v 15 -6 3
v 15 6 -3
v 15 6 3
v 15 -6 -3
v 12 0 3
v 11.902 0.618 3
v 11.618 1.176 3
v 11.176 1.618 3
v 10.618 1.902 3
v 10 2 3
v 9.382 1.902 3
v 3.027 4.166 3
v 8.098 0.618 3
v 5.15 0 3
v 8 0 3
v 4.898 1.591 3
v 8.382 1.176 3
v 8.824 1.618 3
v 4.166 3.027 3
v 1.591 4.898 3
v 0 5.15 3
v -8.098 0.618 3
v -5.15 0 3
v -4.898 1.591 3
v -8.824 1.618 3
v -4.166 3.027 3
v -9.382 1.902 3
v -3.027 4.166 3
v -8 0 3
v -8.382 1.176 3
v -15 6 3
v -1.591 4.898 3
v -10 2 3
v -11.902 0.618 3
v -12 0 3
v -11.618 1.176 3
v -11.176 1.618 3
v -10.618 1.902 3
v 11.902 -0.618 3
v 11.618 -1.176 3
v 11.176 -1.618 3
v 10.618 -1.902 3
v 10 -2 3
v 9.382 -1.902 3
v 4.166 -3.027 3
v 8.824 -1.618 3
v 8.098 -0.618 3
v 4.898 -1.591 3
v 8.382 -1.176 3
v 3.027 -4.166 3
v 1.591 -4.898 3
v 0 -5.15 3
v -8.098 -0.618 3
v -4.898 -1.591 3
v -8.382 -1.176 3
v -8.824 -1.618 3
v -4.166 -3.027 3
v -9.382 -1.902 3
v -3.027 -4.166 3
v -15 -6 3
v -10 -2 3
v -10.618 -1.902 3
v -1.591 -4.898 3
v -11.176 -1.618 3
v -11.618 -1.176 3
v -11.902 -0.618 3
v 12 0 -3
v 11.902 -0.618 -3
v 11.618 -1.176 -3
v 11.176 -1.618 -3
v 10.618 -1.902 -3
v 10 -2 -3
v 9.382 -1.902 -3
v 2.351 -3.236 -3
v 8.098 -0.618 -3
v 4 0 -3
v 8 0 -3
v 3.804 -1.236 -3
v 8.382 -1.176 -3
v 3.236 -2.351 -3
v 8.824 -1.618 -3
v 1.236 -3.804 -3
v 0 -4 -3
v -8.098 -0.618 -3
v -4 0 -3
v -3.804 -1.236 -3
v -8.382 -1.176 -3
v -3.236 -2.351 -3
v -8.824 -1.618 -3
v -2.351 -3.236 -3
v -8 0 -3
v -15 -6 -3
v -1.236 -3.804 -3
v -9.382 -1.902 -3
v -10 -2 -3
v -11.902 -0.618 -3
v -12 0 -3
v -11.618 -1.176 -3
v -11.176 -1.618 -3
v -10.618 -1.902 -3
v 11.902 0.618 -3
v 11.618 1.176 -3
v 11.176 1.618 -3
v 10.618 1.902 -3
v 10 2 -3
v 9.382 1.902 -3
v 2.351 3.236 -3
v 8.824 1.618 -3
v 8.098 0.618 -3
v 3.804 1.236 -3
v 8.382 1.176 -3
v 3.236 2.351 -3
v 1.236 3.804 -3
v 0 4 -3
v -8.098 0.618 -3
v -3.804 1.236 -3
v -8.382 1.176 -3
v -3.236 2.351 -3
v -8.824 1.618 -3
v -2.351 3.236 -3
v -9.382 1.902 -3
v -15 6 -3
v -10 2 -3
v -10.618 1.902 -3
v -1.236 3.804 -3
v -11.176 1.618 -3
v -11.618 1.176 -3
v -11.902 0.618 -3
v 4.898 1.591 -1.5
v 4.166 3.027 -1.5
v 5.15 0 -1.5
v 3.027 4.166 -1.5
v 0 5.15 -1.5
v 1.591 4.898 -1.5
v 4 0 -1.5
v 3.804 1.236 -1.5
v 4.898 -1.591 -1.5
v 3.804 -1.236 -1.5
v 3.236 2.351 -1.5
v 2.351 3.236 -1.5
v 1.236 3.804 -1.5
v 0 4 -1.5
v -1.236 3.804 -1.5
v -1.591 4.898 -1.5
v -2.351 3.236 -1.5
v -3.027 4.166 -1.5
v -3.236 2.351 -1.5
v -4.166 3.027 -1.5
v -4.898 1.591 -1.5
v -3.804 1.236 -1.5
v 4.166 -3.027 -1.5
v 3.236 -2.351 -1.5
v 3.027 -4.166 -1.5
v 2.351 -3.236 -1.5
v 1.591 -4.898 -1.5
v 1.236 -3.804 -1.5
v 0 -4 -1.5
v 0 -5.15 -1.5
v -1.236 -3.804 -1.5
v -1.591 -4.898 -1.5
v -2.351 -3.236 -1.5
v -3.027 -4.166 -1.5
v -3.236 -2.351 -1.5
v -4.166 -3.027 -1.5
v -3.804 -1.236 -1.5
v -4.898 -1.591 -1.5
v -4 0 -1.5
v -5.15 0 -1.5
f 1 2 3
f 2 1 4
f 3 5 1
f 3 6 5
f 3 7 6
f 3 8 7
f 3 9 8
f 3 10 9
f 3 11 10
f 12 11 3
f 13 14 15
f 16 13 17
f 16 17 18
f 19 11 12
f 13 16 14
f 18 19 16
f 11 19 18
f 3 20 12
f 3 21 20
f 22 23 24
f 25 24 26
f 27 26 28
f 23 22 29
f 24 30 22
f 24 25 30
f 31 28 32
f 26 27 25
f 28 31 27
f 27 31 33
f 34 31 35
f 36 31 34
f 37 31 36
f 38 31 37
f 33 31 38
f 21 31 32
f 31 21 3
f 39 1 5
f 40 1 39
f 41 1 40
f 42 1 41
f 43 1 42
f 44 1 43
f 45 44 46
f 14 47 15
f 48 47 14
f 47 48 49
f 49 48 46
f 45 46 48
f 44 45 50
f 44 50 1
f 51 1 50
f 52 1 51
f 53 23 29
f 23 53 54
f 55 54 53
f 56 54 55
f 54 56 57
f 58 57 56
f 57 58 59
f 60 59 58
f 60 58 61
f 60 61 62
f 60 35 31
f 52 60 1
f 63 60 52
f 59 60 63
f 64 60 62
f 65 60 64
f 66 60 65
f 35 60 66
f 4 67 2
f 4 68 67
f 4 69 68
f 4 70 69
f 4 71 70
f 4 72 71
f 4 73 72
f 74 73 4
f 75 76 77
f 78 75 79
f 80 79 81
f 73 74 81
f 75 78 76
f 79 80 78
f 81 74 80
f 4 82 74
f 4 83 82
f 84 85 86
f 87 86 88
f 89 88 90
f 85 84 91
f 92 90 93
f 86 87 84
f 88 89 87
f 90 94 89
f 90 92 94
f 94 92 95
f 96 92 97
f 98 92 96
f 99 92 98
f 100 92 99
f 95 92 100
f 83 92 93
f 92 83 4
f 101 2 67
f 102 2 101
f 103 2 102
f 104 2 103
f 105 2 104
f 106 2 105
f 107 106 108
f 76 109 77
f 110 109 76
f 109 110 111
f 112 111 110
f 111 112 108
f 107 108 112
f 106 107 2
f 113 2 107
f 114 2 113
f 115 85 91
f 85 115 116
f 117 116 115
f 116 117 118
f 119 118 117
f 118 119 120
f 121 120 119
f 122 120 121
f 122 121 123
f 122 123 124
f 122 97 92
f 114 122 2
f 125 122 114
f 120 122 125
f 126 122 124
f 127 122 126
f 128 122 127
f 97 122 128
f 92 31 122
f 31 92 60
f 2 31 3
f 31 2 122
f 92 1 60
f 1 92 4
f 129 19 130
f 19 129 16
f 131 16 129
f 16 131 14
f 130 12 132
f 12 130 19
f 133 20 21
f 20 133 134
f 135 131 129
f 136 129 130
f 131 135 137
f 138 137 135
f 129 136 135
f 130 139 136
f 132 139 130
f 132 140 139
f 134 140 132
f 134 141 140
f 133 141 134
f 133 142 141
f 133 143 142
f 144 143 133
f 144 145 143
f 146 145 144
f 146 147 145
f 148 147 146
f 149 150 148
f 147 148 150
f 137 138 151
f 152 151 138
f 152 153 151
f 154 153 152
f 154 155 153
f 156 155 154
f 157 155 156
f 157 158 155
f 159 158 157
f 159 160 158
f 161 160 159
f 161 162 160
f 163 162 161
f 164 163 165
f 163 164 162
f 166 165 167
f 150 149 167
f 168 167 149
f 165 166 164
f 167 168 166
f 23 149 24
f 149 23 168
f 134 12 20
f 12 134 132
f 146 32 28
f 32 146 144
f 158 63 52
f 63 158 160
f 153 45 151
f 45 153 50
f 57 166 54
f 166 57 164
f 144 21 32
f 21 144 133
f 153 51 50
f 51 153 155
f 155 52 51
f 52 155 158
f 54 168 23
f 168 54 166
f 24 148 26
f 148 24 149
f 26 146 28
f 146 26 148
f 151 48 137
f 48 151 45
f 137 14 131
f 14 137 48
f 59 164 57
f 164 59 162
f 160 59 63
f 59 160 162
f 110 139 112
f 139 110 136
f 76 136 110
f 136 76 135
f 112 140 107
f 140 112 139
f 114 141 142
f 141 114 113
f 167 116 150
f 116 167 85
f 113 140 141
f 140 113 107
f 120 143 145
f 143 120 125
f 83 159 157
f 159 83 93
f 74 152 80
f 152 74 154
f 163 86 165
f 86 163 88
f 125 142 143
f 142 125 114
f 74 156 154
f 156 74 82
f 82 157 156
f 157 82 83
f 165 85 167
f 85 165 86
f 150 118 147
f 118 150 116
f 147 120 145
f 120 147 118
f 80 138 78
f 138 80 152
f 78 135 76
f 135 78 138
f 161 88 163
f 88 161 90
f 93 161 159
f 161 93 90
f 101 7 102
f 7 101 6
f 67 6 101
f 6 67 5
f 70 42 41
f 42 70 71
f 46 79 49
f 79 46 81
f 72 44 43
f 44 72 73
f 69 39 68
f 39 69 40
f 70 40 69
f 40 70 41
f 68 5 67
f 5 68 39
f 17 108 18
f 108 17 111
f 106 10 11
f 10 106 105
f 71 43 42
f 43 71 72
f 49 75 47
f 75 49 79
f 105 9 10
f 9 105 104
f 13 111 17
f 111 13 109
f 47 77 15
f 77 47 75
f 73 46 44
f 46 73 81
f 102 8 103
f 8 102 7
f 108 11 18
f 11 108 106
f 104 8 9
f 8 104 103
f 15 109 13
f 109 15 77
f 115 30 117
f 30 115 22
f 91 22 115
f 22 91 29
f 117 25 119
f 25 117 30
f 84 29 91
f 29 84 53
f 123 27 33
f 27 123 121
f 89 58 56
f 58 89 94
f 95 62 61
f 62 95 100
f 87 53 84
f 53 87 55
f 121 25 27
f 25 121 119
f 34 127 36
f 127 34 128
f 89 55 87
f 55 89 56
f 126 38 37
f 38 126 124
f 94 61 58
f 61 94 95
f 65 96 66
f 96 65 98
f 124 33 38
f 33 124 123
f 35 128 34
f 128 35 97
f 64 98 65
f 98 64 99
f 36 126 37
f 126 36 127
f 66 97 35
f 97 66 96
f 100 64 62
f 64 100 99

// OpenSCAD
// holder for M3 bearing with 3x3 plate
$fn = 20;
d_o = 10.3;
d_o1 = 8;
r_ho = 2.0;

z_b = 5;
z_1 = 1;
z_a = z_b + z_1;

x_1 = 30;

y_1 = 12;

module bearing_box()
{
  difference() {
    cube([x_1,y_1,z_a], true );
    translate([0,0,z_1])
      cylinder(h=z_b, r = d_o/2.0, center = true );
    translate([0,0,z_1])
      cylinder(h=2*z_a, r = d_o1/2.0, center = true );

    translate([ 10, 0,z_1])      cylinder(h=2*z_a, r = r_ho, center = true );
    translate([-10, 0,z_1])      cylinder(h=2*z_a, r = r_ho, center = true );
    // translate([10,5,z_1])      cylinder(h=2*z_a, r = r_ho, center = true );
    // translate([-10,-5,z_1])    cylinder(h=2*z_a, r = r_ho, center = true );
    // translate([10,-5,z_1])     cylinder(h=2*z_a, r = r_ho, center = true );
    // translate([-10,5,z_1])     cylinder(h=2*z_a, r = r_ho, center = true );
  }
}

bearing_box();
